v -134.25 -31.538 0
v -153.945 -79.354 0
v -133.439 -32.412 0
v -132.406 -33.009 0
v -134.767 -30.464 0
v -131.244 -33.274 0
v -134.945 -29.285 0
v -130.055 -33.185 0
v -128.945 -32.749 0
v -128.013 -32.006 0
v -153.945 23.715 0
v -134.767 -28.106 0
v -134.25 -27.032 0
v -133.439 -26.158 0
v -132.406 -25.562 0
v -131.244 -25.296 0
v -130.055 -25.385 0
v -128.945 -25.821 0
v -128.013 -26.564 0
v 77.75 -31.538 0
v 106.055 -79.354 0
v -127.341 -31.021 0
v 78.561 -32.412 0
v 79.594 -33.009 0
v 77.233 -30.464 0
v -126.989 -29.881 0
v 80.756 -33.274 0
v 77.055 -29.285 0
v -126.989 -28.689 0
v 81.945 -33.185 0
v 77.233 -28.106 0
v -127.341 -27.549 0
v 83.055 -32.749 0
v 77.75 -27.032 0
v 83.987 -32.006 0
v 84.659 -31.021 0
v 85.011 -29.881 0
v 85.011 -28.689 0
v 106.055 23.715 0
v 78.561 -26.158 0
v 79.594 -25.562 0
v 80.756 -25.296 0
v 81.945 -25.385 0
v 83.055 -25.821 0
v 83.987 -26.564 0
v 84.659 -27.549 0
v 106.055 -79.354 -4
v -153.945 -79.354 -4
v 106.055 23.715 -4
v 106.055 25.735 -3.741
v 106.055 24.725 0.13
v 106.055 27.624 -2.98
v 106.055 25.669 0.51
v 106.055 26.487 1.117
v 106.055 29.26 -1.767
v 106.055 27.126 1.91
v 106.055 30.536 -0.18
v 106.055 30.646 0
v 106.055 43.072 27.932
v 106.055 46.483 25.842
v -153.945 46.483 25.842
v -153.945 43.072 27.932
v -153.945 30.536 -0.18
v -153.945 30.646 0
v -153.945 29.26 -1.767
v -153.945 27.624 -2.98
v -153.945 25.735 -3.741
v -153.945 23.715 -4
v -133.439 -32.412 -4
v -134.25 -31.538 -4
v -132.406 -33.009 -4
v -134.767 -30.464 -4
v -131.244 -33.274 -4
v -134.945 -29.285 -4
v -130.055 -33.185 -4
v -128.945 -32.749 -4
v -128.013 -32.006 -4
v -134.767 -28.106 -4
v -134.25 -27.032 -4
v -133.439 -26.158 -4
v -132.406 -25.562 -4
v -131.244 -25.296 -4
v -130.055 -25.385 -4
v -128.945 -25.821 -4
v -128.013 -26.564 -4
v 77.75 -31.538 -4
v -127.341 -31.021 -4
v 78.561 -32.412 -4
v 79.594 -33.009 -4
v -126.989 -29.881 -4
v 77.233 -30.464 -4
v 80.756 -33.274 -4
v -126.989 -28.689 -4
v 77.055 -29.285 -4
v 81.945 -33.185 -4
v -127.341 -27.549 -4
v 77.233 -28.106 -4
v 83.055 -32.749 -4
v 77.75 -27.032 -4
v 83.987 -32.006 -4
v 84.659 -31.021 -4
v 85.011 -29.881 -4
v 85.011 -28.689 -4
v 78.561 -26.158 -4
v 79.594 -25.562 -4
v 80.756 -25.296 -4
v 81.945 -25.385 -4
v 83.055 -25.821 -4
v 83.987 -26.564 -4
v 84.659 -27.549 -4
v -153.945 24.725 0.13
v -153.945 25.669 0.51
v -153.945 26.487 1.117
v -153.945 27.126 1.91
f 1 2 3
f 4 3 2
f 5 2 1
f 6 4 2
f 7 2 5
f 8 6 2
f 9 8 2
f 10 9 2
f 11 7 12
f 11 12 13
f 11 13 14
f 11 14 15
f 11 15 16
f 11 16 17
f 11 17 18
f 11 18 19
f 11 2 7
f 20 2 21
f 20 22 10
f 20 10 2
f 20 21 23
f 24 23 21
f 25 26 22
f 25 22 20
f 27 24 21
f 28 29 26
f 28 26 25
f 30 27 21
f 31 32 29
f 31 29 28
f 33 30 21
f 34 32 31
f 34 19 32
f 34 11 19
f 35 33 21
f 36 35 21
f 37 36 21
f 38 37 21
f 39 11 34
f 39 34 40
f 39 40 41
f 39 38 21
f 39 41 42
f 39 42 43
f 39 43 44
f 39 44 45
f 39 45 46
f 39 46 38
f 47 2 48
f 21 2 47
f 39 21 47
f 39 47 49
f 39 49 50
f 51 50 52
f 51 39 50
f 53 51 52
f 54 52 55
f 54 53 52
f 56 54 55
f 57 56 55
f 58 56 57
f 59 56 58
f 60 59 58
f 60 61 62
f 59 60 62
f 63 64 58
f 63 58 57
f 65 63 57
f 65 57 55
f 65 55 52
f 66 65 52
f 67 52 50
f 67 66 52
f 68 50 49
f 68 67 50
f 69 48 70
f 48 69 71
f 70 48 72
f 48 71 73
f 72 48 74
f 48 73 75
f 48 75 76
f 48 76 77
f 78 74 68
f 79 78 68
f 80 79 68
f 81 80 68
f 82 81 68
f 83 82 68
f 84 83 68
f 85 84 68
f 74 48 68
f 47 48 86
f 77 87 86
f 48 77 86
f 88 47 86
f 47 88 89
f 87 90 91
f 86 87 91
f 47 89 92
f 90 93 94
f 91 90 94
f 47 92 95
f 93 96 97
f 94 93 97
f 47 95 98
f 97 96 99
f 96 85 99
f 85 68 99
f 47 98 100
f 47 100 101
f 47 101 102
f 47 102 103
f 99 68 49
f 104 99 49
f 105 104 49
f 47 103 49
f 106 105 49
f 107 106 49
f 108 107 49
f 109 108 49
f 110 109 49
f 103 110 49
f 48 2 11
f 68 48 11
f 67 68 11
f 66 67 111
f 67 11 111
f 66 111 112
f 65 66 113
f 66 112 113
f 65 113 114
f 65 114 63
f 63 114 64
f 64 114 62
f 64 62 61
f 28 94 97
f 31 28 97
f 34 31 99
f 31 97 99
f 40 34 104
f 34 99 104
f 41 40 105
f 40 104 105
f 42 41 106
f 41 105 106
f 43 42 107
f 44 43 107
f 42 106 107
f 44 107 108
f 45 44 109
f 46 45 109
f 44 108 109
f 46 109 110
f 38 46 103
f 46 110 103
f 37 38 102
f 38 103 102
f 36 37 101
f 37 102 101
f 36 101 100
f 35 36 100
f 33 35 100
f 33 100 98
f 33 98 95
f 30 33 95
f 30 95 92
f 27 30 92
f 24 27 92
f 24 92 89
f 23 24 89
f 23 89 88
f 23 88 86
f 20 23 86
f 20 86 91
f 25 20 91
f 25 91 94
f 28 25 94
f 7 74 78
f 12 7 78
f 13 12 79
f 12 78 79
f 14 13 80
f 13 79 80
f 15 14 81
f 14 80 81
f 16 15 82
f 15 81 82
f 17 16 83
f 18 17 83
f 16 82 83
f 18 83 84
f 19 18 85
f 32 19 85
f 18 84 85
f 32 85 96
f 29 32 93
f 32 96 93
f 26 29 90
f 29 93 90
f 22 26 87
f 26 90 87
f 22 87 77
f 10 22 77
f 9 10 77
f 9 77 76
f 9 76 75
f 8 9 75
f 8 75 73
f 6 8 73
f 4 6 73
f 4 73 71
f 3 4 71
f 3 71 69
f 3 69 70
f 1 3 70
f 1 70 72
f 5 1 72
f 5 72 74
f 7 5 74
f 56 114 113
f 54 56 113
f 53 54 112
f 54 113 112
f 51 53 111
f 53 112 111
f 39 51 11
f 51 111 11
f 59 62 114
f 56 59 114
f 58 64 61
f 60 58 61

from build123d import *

# Parameters (mm, degrees)
SKETCH1_W            = 260
SKETCH1_H            = 110
BASE_FLANGE1_DEPTH   = 4
EDGE_FLANGE1_START   = -153.944751381
EDGE_FLANGE1_DEPTH   = 260
EDGE_FLANGE1_2_DEPTH = 260
SKETCH11_R           = 4
CUT_EXTRUDE1_DEPTH   = 177.112626118


# Read off the part's stored shape, not the designer's step: Edge-Flange1
# Sheet-metal steps are written as plain solids
with BuildPart() as part:
    # Sketch1 → Base-Flange1 (new body)
    with BuildSketch(Plane.XY):
        with Locations((-23.944751381, -24.35359116)):
            Rectangle(SKETCH1_W, SKETCH1_H)
    extrude(amount=-BASE_FLANGE1_DEPTH)

    # Edge-Flange1 outline → Edge-Flange1 (cut)
    with BuildSketch(Plane.YZ.offset(EDGE_FLANGE1_START)):
        with BuildLine():
            Line((30.64640884, 0), (30.536111734, -0.179988518))
            ThreePointArc((30.536111734, -0.179988518), (27.623960351, -2.979968057), (23.714990419, -4))
            Line((23.714990419, -4), (30.64640884, -4))
            Line((30.64640884, -4), (30.64640884, 0))
        make_face()
    extrude(amount=EDGE_FLANGE1_DEPTH, mode=Mode.SUBTRACT)

    # Edge-Flange1 2 outline → Edge-Flange1 2 (add)
    with BuildSketch(Plane.YZ.offset(EDGE_FLANGE1_START)):
        with BuildLine():
            Line((23.714990419, 0), (30.64640884, 0))
            Line((30.64640884, 0), (46.482655452, 25.842405752))
            Line((46.482655452, 25.842405752), (43.072094795, 27.932400011))
            Line((43.072094795, 27.932400011), (27.125551077, 1.910005741))
            ThreePointArc((27.125551077, 1.910005741), (25.669475385, 0.510015972), (23.714990419, 0))
        make_face()
    extrude(amount=EDGE_FLANGE1_2_DEPTH)

    # Sketch11 → Cut-Extrude1 (cut, through all)
    with BuildSketch(Plane(origin=(0, 0, -4), x_dir=(-1, 0, 0), z_dir=(0, 0, -1))):
        with Locations((-81.055248619, -29.285009581)):
            Circle(SKETCH11_R)
        with Locations((130.944751381, -29.285009581)):
            Circle(SKETCH11_R)
    extrude(amount=-CUT_EXTRUDE1_DEPTH, mode=Mode.SUBTRACT)


solid = part.part
